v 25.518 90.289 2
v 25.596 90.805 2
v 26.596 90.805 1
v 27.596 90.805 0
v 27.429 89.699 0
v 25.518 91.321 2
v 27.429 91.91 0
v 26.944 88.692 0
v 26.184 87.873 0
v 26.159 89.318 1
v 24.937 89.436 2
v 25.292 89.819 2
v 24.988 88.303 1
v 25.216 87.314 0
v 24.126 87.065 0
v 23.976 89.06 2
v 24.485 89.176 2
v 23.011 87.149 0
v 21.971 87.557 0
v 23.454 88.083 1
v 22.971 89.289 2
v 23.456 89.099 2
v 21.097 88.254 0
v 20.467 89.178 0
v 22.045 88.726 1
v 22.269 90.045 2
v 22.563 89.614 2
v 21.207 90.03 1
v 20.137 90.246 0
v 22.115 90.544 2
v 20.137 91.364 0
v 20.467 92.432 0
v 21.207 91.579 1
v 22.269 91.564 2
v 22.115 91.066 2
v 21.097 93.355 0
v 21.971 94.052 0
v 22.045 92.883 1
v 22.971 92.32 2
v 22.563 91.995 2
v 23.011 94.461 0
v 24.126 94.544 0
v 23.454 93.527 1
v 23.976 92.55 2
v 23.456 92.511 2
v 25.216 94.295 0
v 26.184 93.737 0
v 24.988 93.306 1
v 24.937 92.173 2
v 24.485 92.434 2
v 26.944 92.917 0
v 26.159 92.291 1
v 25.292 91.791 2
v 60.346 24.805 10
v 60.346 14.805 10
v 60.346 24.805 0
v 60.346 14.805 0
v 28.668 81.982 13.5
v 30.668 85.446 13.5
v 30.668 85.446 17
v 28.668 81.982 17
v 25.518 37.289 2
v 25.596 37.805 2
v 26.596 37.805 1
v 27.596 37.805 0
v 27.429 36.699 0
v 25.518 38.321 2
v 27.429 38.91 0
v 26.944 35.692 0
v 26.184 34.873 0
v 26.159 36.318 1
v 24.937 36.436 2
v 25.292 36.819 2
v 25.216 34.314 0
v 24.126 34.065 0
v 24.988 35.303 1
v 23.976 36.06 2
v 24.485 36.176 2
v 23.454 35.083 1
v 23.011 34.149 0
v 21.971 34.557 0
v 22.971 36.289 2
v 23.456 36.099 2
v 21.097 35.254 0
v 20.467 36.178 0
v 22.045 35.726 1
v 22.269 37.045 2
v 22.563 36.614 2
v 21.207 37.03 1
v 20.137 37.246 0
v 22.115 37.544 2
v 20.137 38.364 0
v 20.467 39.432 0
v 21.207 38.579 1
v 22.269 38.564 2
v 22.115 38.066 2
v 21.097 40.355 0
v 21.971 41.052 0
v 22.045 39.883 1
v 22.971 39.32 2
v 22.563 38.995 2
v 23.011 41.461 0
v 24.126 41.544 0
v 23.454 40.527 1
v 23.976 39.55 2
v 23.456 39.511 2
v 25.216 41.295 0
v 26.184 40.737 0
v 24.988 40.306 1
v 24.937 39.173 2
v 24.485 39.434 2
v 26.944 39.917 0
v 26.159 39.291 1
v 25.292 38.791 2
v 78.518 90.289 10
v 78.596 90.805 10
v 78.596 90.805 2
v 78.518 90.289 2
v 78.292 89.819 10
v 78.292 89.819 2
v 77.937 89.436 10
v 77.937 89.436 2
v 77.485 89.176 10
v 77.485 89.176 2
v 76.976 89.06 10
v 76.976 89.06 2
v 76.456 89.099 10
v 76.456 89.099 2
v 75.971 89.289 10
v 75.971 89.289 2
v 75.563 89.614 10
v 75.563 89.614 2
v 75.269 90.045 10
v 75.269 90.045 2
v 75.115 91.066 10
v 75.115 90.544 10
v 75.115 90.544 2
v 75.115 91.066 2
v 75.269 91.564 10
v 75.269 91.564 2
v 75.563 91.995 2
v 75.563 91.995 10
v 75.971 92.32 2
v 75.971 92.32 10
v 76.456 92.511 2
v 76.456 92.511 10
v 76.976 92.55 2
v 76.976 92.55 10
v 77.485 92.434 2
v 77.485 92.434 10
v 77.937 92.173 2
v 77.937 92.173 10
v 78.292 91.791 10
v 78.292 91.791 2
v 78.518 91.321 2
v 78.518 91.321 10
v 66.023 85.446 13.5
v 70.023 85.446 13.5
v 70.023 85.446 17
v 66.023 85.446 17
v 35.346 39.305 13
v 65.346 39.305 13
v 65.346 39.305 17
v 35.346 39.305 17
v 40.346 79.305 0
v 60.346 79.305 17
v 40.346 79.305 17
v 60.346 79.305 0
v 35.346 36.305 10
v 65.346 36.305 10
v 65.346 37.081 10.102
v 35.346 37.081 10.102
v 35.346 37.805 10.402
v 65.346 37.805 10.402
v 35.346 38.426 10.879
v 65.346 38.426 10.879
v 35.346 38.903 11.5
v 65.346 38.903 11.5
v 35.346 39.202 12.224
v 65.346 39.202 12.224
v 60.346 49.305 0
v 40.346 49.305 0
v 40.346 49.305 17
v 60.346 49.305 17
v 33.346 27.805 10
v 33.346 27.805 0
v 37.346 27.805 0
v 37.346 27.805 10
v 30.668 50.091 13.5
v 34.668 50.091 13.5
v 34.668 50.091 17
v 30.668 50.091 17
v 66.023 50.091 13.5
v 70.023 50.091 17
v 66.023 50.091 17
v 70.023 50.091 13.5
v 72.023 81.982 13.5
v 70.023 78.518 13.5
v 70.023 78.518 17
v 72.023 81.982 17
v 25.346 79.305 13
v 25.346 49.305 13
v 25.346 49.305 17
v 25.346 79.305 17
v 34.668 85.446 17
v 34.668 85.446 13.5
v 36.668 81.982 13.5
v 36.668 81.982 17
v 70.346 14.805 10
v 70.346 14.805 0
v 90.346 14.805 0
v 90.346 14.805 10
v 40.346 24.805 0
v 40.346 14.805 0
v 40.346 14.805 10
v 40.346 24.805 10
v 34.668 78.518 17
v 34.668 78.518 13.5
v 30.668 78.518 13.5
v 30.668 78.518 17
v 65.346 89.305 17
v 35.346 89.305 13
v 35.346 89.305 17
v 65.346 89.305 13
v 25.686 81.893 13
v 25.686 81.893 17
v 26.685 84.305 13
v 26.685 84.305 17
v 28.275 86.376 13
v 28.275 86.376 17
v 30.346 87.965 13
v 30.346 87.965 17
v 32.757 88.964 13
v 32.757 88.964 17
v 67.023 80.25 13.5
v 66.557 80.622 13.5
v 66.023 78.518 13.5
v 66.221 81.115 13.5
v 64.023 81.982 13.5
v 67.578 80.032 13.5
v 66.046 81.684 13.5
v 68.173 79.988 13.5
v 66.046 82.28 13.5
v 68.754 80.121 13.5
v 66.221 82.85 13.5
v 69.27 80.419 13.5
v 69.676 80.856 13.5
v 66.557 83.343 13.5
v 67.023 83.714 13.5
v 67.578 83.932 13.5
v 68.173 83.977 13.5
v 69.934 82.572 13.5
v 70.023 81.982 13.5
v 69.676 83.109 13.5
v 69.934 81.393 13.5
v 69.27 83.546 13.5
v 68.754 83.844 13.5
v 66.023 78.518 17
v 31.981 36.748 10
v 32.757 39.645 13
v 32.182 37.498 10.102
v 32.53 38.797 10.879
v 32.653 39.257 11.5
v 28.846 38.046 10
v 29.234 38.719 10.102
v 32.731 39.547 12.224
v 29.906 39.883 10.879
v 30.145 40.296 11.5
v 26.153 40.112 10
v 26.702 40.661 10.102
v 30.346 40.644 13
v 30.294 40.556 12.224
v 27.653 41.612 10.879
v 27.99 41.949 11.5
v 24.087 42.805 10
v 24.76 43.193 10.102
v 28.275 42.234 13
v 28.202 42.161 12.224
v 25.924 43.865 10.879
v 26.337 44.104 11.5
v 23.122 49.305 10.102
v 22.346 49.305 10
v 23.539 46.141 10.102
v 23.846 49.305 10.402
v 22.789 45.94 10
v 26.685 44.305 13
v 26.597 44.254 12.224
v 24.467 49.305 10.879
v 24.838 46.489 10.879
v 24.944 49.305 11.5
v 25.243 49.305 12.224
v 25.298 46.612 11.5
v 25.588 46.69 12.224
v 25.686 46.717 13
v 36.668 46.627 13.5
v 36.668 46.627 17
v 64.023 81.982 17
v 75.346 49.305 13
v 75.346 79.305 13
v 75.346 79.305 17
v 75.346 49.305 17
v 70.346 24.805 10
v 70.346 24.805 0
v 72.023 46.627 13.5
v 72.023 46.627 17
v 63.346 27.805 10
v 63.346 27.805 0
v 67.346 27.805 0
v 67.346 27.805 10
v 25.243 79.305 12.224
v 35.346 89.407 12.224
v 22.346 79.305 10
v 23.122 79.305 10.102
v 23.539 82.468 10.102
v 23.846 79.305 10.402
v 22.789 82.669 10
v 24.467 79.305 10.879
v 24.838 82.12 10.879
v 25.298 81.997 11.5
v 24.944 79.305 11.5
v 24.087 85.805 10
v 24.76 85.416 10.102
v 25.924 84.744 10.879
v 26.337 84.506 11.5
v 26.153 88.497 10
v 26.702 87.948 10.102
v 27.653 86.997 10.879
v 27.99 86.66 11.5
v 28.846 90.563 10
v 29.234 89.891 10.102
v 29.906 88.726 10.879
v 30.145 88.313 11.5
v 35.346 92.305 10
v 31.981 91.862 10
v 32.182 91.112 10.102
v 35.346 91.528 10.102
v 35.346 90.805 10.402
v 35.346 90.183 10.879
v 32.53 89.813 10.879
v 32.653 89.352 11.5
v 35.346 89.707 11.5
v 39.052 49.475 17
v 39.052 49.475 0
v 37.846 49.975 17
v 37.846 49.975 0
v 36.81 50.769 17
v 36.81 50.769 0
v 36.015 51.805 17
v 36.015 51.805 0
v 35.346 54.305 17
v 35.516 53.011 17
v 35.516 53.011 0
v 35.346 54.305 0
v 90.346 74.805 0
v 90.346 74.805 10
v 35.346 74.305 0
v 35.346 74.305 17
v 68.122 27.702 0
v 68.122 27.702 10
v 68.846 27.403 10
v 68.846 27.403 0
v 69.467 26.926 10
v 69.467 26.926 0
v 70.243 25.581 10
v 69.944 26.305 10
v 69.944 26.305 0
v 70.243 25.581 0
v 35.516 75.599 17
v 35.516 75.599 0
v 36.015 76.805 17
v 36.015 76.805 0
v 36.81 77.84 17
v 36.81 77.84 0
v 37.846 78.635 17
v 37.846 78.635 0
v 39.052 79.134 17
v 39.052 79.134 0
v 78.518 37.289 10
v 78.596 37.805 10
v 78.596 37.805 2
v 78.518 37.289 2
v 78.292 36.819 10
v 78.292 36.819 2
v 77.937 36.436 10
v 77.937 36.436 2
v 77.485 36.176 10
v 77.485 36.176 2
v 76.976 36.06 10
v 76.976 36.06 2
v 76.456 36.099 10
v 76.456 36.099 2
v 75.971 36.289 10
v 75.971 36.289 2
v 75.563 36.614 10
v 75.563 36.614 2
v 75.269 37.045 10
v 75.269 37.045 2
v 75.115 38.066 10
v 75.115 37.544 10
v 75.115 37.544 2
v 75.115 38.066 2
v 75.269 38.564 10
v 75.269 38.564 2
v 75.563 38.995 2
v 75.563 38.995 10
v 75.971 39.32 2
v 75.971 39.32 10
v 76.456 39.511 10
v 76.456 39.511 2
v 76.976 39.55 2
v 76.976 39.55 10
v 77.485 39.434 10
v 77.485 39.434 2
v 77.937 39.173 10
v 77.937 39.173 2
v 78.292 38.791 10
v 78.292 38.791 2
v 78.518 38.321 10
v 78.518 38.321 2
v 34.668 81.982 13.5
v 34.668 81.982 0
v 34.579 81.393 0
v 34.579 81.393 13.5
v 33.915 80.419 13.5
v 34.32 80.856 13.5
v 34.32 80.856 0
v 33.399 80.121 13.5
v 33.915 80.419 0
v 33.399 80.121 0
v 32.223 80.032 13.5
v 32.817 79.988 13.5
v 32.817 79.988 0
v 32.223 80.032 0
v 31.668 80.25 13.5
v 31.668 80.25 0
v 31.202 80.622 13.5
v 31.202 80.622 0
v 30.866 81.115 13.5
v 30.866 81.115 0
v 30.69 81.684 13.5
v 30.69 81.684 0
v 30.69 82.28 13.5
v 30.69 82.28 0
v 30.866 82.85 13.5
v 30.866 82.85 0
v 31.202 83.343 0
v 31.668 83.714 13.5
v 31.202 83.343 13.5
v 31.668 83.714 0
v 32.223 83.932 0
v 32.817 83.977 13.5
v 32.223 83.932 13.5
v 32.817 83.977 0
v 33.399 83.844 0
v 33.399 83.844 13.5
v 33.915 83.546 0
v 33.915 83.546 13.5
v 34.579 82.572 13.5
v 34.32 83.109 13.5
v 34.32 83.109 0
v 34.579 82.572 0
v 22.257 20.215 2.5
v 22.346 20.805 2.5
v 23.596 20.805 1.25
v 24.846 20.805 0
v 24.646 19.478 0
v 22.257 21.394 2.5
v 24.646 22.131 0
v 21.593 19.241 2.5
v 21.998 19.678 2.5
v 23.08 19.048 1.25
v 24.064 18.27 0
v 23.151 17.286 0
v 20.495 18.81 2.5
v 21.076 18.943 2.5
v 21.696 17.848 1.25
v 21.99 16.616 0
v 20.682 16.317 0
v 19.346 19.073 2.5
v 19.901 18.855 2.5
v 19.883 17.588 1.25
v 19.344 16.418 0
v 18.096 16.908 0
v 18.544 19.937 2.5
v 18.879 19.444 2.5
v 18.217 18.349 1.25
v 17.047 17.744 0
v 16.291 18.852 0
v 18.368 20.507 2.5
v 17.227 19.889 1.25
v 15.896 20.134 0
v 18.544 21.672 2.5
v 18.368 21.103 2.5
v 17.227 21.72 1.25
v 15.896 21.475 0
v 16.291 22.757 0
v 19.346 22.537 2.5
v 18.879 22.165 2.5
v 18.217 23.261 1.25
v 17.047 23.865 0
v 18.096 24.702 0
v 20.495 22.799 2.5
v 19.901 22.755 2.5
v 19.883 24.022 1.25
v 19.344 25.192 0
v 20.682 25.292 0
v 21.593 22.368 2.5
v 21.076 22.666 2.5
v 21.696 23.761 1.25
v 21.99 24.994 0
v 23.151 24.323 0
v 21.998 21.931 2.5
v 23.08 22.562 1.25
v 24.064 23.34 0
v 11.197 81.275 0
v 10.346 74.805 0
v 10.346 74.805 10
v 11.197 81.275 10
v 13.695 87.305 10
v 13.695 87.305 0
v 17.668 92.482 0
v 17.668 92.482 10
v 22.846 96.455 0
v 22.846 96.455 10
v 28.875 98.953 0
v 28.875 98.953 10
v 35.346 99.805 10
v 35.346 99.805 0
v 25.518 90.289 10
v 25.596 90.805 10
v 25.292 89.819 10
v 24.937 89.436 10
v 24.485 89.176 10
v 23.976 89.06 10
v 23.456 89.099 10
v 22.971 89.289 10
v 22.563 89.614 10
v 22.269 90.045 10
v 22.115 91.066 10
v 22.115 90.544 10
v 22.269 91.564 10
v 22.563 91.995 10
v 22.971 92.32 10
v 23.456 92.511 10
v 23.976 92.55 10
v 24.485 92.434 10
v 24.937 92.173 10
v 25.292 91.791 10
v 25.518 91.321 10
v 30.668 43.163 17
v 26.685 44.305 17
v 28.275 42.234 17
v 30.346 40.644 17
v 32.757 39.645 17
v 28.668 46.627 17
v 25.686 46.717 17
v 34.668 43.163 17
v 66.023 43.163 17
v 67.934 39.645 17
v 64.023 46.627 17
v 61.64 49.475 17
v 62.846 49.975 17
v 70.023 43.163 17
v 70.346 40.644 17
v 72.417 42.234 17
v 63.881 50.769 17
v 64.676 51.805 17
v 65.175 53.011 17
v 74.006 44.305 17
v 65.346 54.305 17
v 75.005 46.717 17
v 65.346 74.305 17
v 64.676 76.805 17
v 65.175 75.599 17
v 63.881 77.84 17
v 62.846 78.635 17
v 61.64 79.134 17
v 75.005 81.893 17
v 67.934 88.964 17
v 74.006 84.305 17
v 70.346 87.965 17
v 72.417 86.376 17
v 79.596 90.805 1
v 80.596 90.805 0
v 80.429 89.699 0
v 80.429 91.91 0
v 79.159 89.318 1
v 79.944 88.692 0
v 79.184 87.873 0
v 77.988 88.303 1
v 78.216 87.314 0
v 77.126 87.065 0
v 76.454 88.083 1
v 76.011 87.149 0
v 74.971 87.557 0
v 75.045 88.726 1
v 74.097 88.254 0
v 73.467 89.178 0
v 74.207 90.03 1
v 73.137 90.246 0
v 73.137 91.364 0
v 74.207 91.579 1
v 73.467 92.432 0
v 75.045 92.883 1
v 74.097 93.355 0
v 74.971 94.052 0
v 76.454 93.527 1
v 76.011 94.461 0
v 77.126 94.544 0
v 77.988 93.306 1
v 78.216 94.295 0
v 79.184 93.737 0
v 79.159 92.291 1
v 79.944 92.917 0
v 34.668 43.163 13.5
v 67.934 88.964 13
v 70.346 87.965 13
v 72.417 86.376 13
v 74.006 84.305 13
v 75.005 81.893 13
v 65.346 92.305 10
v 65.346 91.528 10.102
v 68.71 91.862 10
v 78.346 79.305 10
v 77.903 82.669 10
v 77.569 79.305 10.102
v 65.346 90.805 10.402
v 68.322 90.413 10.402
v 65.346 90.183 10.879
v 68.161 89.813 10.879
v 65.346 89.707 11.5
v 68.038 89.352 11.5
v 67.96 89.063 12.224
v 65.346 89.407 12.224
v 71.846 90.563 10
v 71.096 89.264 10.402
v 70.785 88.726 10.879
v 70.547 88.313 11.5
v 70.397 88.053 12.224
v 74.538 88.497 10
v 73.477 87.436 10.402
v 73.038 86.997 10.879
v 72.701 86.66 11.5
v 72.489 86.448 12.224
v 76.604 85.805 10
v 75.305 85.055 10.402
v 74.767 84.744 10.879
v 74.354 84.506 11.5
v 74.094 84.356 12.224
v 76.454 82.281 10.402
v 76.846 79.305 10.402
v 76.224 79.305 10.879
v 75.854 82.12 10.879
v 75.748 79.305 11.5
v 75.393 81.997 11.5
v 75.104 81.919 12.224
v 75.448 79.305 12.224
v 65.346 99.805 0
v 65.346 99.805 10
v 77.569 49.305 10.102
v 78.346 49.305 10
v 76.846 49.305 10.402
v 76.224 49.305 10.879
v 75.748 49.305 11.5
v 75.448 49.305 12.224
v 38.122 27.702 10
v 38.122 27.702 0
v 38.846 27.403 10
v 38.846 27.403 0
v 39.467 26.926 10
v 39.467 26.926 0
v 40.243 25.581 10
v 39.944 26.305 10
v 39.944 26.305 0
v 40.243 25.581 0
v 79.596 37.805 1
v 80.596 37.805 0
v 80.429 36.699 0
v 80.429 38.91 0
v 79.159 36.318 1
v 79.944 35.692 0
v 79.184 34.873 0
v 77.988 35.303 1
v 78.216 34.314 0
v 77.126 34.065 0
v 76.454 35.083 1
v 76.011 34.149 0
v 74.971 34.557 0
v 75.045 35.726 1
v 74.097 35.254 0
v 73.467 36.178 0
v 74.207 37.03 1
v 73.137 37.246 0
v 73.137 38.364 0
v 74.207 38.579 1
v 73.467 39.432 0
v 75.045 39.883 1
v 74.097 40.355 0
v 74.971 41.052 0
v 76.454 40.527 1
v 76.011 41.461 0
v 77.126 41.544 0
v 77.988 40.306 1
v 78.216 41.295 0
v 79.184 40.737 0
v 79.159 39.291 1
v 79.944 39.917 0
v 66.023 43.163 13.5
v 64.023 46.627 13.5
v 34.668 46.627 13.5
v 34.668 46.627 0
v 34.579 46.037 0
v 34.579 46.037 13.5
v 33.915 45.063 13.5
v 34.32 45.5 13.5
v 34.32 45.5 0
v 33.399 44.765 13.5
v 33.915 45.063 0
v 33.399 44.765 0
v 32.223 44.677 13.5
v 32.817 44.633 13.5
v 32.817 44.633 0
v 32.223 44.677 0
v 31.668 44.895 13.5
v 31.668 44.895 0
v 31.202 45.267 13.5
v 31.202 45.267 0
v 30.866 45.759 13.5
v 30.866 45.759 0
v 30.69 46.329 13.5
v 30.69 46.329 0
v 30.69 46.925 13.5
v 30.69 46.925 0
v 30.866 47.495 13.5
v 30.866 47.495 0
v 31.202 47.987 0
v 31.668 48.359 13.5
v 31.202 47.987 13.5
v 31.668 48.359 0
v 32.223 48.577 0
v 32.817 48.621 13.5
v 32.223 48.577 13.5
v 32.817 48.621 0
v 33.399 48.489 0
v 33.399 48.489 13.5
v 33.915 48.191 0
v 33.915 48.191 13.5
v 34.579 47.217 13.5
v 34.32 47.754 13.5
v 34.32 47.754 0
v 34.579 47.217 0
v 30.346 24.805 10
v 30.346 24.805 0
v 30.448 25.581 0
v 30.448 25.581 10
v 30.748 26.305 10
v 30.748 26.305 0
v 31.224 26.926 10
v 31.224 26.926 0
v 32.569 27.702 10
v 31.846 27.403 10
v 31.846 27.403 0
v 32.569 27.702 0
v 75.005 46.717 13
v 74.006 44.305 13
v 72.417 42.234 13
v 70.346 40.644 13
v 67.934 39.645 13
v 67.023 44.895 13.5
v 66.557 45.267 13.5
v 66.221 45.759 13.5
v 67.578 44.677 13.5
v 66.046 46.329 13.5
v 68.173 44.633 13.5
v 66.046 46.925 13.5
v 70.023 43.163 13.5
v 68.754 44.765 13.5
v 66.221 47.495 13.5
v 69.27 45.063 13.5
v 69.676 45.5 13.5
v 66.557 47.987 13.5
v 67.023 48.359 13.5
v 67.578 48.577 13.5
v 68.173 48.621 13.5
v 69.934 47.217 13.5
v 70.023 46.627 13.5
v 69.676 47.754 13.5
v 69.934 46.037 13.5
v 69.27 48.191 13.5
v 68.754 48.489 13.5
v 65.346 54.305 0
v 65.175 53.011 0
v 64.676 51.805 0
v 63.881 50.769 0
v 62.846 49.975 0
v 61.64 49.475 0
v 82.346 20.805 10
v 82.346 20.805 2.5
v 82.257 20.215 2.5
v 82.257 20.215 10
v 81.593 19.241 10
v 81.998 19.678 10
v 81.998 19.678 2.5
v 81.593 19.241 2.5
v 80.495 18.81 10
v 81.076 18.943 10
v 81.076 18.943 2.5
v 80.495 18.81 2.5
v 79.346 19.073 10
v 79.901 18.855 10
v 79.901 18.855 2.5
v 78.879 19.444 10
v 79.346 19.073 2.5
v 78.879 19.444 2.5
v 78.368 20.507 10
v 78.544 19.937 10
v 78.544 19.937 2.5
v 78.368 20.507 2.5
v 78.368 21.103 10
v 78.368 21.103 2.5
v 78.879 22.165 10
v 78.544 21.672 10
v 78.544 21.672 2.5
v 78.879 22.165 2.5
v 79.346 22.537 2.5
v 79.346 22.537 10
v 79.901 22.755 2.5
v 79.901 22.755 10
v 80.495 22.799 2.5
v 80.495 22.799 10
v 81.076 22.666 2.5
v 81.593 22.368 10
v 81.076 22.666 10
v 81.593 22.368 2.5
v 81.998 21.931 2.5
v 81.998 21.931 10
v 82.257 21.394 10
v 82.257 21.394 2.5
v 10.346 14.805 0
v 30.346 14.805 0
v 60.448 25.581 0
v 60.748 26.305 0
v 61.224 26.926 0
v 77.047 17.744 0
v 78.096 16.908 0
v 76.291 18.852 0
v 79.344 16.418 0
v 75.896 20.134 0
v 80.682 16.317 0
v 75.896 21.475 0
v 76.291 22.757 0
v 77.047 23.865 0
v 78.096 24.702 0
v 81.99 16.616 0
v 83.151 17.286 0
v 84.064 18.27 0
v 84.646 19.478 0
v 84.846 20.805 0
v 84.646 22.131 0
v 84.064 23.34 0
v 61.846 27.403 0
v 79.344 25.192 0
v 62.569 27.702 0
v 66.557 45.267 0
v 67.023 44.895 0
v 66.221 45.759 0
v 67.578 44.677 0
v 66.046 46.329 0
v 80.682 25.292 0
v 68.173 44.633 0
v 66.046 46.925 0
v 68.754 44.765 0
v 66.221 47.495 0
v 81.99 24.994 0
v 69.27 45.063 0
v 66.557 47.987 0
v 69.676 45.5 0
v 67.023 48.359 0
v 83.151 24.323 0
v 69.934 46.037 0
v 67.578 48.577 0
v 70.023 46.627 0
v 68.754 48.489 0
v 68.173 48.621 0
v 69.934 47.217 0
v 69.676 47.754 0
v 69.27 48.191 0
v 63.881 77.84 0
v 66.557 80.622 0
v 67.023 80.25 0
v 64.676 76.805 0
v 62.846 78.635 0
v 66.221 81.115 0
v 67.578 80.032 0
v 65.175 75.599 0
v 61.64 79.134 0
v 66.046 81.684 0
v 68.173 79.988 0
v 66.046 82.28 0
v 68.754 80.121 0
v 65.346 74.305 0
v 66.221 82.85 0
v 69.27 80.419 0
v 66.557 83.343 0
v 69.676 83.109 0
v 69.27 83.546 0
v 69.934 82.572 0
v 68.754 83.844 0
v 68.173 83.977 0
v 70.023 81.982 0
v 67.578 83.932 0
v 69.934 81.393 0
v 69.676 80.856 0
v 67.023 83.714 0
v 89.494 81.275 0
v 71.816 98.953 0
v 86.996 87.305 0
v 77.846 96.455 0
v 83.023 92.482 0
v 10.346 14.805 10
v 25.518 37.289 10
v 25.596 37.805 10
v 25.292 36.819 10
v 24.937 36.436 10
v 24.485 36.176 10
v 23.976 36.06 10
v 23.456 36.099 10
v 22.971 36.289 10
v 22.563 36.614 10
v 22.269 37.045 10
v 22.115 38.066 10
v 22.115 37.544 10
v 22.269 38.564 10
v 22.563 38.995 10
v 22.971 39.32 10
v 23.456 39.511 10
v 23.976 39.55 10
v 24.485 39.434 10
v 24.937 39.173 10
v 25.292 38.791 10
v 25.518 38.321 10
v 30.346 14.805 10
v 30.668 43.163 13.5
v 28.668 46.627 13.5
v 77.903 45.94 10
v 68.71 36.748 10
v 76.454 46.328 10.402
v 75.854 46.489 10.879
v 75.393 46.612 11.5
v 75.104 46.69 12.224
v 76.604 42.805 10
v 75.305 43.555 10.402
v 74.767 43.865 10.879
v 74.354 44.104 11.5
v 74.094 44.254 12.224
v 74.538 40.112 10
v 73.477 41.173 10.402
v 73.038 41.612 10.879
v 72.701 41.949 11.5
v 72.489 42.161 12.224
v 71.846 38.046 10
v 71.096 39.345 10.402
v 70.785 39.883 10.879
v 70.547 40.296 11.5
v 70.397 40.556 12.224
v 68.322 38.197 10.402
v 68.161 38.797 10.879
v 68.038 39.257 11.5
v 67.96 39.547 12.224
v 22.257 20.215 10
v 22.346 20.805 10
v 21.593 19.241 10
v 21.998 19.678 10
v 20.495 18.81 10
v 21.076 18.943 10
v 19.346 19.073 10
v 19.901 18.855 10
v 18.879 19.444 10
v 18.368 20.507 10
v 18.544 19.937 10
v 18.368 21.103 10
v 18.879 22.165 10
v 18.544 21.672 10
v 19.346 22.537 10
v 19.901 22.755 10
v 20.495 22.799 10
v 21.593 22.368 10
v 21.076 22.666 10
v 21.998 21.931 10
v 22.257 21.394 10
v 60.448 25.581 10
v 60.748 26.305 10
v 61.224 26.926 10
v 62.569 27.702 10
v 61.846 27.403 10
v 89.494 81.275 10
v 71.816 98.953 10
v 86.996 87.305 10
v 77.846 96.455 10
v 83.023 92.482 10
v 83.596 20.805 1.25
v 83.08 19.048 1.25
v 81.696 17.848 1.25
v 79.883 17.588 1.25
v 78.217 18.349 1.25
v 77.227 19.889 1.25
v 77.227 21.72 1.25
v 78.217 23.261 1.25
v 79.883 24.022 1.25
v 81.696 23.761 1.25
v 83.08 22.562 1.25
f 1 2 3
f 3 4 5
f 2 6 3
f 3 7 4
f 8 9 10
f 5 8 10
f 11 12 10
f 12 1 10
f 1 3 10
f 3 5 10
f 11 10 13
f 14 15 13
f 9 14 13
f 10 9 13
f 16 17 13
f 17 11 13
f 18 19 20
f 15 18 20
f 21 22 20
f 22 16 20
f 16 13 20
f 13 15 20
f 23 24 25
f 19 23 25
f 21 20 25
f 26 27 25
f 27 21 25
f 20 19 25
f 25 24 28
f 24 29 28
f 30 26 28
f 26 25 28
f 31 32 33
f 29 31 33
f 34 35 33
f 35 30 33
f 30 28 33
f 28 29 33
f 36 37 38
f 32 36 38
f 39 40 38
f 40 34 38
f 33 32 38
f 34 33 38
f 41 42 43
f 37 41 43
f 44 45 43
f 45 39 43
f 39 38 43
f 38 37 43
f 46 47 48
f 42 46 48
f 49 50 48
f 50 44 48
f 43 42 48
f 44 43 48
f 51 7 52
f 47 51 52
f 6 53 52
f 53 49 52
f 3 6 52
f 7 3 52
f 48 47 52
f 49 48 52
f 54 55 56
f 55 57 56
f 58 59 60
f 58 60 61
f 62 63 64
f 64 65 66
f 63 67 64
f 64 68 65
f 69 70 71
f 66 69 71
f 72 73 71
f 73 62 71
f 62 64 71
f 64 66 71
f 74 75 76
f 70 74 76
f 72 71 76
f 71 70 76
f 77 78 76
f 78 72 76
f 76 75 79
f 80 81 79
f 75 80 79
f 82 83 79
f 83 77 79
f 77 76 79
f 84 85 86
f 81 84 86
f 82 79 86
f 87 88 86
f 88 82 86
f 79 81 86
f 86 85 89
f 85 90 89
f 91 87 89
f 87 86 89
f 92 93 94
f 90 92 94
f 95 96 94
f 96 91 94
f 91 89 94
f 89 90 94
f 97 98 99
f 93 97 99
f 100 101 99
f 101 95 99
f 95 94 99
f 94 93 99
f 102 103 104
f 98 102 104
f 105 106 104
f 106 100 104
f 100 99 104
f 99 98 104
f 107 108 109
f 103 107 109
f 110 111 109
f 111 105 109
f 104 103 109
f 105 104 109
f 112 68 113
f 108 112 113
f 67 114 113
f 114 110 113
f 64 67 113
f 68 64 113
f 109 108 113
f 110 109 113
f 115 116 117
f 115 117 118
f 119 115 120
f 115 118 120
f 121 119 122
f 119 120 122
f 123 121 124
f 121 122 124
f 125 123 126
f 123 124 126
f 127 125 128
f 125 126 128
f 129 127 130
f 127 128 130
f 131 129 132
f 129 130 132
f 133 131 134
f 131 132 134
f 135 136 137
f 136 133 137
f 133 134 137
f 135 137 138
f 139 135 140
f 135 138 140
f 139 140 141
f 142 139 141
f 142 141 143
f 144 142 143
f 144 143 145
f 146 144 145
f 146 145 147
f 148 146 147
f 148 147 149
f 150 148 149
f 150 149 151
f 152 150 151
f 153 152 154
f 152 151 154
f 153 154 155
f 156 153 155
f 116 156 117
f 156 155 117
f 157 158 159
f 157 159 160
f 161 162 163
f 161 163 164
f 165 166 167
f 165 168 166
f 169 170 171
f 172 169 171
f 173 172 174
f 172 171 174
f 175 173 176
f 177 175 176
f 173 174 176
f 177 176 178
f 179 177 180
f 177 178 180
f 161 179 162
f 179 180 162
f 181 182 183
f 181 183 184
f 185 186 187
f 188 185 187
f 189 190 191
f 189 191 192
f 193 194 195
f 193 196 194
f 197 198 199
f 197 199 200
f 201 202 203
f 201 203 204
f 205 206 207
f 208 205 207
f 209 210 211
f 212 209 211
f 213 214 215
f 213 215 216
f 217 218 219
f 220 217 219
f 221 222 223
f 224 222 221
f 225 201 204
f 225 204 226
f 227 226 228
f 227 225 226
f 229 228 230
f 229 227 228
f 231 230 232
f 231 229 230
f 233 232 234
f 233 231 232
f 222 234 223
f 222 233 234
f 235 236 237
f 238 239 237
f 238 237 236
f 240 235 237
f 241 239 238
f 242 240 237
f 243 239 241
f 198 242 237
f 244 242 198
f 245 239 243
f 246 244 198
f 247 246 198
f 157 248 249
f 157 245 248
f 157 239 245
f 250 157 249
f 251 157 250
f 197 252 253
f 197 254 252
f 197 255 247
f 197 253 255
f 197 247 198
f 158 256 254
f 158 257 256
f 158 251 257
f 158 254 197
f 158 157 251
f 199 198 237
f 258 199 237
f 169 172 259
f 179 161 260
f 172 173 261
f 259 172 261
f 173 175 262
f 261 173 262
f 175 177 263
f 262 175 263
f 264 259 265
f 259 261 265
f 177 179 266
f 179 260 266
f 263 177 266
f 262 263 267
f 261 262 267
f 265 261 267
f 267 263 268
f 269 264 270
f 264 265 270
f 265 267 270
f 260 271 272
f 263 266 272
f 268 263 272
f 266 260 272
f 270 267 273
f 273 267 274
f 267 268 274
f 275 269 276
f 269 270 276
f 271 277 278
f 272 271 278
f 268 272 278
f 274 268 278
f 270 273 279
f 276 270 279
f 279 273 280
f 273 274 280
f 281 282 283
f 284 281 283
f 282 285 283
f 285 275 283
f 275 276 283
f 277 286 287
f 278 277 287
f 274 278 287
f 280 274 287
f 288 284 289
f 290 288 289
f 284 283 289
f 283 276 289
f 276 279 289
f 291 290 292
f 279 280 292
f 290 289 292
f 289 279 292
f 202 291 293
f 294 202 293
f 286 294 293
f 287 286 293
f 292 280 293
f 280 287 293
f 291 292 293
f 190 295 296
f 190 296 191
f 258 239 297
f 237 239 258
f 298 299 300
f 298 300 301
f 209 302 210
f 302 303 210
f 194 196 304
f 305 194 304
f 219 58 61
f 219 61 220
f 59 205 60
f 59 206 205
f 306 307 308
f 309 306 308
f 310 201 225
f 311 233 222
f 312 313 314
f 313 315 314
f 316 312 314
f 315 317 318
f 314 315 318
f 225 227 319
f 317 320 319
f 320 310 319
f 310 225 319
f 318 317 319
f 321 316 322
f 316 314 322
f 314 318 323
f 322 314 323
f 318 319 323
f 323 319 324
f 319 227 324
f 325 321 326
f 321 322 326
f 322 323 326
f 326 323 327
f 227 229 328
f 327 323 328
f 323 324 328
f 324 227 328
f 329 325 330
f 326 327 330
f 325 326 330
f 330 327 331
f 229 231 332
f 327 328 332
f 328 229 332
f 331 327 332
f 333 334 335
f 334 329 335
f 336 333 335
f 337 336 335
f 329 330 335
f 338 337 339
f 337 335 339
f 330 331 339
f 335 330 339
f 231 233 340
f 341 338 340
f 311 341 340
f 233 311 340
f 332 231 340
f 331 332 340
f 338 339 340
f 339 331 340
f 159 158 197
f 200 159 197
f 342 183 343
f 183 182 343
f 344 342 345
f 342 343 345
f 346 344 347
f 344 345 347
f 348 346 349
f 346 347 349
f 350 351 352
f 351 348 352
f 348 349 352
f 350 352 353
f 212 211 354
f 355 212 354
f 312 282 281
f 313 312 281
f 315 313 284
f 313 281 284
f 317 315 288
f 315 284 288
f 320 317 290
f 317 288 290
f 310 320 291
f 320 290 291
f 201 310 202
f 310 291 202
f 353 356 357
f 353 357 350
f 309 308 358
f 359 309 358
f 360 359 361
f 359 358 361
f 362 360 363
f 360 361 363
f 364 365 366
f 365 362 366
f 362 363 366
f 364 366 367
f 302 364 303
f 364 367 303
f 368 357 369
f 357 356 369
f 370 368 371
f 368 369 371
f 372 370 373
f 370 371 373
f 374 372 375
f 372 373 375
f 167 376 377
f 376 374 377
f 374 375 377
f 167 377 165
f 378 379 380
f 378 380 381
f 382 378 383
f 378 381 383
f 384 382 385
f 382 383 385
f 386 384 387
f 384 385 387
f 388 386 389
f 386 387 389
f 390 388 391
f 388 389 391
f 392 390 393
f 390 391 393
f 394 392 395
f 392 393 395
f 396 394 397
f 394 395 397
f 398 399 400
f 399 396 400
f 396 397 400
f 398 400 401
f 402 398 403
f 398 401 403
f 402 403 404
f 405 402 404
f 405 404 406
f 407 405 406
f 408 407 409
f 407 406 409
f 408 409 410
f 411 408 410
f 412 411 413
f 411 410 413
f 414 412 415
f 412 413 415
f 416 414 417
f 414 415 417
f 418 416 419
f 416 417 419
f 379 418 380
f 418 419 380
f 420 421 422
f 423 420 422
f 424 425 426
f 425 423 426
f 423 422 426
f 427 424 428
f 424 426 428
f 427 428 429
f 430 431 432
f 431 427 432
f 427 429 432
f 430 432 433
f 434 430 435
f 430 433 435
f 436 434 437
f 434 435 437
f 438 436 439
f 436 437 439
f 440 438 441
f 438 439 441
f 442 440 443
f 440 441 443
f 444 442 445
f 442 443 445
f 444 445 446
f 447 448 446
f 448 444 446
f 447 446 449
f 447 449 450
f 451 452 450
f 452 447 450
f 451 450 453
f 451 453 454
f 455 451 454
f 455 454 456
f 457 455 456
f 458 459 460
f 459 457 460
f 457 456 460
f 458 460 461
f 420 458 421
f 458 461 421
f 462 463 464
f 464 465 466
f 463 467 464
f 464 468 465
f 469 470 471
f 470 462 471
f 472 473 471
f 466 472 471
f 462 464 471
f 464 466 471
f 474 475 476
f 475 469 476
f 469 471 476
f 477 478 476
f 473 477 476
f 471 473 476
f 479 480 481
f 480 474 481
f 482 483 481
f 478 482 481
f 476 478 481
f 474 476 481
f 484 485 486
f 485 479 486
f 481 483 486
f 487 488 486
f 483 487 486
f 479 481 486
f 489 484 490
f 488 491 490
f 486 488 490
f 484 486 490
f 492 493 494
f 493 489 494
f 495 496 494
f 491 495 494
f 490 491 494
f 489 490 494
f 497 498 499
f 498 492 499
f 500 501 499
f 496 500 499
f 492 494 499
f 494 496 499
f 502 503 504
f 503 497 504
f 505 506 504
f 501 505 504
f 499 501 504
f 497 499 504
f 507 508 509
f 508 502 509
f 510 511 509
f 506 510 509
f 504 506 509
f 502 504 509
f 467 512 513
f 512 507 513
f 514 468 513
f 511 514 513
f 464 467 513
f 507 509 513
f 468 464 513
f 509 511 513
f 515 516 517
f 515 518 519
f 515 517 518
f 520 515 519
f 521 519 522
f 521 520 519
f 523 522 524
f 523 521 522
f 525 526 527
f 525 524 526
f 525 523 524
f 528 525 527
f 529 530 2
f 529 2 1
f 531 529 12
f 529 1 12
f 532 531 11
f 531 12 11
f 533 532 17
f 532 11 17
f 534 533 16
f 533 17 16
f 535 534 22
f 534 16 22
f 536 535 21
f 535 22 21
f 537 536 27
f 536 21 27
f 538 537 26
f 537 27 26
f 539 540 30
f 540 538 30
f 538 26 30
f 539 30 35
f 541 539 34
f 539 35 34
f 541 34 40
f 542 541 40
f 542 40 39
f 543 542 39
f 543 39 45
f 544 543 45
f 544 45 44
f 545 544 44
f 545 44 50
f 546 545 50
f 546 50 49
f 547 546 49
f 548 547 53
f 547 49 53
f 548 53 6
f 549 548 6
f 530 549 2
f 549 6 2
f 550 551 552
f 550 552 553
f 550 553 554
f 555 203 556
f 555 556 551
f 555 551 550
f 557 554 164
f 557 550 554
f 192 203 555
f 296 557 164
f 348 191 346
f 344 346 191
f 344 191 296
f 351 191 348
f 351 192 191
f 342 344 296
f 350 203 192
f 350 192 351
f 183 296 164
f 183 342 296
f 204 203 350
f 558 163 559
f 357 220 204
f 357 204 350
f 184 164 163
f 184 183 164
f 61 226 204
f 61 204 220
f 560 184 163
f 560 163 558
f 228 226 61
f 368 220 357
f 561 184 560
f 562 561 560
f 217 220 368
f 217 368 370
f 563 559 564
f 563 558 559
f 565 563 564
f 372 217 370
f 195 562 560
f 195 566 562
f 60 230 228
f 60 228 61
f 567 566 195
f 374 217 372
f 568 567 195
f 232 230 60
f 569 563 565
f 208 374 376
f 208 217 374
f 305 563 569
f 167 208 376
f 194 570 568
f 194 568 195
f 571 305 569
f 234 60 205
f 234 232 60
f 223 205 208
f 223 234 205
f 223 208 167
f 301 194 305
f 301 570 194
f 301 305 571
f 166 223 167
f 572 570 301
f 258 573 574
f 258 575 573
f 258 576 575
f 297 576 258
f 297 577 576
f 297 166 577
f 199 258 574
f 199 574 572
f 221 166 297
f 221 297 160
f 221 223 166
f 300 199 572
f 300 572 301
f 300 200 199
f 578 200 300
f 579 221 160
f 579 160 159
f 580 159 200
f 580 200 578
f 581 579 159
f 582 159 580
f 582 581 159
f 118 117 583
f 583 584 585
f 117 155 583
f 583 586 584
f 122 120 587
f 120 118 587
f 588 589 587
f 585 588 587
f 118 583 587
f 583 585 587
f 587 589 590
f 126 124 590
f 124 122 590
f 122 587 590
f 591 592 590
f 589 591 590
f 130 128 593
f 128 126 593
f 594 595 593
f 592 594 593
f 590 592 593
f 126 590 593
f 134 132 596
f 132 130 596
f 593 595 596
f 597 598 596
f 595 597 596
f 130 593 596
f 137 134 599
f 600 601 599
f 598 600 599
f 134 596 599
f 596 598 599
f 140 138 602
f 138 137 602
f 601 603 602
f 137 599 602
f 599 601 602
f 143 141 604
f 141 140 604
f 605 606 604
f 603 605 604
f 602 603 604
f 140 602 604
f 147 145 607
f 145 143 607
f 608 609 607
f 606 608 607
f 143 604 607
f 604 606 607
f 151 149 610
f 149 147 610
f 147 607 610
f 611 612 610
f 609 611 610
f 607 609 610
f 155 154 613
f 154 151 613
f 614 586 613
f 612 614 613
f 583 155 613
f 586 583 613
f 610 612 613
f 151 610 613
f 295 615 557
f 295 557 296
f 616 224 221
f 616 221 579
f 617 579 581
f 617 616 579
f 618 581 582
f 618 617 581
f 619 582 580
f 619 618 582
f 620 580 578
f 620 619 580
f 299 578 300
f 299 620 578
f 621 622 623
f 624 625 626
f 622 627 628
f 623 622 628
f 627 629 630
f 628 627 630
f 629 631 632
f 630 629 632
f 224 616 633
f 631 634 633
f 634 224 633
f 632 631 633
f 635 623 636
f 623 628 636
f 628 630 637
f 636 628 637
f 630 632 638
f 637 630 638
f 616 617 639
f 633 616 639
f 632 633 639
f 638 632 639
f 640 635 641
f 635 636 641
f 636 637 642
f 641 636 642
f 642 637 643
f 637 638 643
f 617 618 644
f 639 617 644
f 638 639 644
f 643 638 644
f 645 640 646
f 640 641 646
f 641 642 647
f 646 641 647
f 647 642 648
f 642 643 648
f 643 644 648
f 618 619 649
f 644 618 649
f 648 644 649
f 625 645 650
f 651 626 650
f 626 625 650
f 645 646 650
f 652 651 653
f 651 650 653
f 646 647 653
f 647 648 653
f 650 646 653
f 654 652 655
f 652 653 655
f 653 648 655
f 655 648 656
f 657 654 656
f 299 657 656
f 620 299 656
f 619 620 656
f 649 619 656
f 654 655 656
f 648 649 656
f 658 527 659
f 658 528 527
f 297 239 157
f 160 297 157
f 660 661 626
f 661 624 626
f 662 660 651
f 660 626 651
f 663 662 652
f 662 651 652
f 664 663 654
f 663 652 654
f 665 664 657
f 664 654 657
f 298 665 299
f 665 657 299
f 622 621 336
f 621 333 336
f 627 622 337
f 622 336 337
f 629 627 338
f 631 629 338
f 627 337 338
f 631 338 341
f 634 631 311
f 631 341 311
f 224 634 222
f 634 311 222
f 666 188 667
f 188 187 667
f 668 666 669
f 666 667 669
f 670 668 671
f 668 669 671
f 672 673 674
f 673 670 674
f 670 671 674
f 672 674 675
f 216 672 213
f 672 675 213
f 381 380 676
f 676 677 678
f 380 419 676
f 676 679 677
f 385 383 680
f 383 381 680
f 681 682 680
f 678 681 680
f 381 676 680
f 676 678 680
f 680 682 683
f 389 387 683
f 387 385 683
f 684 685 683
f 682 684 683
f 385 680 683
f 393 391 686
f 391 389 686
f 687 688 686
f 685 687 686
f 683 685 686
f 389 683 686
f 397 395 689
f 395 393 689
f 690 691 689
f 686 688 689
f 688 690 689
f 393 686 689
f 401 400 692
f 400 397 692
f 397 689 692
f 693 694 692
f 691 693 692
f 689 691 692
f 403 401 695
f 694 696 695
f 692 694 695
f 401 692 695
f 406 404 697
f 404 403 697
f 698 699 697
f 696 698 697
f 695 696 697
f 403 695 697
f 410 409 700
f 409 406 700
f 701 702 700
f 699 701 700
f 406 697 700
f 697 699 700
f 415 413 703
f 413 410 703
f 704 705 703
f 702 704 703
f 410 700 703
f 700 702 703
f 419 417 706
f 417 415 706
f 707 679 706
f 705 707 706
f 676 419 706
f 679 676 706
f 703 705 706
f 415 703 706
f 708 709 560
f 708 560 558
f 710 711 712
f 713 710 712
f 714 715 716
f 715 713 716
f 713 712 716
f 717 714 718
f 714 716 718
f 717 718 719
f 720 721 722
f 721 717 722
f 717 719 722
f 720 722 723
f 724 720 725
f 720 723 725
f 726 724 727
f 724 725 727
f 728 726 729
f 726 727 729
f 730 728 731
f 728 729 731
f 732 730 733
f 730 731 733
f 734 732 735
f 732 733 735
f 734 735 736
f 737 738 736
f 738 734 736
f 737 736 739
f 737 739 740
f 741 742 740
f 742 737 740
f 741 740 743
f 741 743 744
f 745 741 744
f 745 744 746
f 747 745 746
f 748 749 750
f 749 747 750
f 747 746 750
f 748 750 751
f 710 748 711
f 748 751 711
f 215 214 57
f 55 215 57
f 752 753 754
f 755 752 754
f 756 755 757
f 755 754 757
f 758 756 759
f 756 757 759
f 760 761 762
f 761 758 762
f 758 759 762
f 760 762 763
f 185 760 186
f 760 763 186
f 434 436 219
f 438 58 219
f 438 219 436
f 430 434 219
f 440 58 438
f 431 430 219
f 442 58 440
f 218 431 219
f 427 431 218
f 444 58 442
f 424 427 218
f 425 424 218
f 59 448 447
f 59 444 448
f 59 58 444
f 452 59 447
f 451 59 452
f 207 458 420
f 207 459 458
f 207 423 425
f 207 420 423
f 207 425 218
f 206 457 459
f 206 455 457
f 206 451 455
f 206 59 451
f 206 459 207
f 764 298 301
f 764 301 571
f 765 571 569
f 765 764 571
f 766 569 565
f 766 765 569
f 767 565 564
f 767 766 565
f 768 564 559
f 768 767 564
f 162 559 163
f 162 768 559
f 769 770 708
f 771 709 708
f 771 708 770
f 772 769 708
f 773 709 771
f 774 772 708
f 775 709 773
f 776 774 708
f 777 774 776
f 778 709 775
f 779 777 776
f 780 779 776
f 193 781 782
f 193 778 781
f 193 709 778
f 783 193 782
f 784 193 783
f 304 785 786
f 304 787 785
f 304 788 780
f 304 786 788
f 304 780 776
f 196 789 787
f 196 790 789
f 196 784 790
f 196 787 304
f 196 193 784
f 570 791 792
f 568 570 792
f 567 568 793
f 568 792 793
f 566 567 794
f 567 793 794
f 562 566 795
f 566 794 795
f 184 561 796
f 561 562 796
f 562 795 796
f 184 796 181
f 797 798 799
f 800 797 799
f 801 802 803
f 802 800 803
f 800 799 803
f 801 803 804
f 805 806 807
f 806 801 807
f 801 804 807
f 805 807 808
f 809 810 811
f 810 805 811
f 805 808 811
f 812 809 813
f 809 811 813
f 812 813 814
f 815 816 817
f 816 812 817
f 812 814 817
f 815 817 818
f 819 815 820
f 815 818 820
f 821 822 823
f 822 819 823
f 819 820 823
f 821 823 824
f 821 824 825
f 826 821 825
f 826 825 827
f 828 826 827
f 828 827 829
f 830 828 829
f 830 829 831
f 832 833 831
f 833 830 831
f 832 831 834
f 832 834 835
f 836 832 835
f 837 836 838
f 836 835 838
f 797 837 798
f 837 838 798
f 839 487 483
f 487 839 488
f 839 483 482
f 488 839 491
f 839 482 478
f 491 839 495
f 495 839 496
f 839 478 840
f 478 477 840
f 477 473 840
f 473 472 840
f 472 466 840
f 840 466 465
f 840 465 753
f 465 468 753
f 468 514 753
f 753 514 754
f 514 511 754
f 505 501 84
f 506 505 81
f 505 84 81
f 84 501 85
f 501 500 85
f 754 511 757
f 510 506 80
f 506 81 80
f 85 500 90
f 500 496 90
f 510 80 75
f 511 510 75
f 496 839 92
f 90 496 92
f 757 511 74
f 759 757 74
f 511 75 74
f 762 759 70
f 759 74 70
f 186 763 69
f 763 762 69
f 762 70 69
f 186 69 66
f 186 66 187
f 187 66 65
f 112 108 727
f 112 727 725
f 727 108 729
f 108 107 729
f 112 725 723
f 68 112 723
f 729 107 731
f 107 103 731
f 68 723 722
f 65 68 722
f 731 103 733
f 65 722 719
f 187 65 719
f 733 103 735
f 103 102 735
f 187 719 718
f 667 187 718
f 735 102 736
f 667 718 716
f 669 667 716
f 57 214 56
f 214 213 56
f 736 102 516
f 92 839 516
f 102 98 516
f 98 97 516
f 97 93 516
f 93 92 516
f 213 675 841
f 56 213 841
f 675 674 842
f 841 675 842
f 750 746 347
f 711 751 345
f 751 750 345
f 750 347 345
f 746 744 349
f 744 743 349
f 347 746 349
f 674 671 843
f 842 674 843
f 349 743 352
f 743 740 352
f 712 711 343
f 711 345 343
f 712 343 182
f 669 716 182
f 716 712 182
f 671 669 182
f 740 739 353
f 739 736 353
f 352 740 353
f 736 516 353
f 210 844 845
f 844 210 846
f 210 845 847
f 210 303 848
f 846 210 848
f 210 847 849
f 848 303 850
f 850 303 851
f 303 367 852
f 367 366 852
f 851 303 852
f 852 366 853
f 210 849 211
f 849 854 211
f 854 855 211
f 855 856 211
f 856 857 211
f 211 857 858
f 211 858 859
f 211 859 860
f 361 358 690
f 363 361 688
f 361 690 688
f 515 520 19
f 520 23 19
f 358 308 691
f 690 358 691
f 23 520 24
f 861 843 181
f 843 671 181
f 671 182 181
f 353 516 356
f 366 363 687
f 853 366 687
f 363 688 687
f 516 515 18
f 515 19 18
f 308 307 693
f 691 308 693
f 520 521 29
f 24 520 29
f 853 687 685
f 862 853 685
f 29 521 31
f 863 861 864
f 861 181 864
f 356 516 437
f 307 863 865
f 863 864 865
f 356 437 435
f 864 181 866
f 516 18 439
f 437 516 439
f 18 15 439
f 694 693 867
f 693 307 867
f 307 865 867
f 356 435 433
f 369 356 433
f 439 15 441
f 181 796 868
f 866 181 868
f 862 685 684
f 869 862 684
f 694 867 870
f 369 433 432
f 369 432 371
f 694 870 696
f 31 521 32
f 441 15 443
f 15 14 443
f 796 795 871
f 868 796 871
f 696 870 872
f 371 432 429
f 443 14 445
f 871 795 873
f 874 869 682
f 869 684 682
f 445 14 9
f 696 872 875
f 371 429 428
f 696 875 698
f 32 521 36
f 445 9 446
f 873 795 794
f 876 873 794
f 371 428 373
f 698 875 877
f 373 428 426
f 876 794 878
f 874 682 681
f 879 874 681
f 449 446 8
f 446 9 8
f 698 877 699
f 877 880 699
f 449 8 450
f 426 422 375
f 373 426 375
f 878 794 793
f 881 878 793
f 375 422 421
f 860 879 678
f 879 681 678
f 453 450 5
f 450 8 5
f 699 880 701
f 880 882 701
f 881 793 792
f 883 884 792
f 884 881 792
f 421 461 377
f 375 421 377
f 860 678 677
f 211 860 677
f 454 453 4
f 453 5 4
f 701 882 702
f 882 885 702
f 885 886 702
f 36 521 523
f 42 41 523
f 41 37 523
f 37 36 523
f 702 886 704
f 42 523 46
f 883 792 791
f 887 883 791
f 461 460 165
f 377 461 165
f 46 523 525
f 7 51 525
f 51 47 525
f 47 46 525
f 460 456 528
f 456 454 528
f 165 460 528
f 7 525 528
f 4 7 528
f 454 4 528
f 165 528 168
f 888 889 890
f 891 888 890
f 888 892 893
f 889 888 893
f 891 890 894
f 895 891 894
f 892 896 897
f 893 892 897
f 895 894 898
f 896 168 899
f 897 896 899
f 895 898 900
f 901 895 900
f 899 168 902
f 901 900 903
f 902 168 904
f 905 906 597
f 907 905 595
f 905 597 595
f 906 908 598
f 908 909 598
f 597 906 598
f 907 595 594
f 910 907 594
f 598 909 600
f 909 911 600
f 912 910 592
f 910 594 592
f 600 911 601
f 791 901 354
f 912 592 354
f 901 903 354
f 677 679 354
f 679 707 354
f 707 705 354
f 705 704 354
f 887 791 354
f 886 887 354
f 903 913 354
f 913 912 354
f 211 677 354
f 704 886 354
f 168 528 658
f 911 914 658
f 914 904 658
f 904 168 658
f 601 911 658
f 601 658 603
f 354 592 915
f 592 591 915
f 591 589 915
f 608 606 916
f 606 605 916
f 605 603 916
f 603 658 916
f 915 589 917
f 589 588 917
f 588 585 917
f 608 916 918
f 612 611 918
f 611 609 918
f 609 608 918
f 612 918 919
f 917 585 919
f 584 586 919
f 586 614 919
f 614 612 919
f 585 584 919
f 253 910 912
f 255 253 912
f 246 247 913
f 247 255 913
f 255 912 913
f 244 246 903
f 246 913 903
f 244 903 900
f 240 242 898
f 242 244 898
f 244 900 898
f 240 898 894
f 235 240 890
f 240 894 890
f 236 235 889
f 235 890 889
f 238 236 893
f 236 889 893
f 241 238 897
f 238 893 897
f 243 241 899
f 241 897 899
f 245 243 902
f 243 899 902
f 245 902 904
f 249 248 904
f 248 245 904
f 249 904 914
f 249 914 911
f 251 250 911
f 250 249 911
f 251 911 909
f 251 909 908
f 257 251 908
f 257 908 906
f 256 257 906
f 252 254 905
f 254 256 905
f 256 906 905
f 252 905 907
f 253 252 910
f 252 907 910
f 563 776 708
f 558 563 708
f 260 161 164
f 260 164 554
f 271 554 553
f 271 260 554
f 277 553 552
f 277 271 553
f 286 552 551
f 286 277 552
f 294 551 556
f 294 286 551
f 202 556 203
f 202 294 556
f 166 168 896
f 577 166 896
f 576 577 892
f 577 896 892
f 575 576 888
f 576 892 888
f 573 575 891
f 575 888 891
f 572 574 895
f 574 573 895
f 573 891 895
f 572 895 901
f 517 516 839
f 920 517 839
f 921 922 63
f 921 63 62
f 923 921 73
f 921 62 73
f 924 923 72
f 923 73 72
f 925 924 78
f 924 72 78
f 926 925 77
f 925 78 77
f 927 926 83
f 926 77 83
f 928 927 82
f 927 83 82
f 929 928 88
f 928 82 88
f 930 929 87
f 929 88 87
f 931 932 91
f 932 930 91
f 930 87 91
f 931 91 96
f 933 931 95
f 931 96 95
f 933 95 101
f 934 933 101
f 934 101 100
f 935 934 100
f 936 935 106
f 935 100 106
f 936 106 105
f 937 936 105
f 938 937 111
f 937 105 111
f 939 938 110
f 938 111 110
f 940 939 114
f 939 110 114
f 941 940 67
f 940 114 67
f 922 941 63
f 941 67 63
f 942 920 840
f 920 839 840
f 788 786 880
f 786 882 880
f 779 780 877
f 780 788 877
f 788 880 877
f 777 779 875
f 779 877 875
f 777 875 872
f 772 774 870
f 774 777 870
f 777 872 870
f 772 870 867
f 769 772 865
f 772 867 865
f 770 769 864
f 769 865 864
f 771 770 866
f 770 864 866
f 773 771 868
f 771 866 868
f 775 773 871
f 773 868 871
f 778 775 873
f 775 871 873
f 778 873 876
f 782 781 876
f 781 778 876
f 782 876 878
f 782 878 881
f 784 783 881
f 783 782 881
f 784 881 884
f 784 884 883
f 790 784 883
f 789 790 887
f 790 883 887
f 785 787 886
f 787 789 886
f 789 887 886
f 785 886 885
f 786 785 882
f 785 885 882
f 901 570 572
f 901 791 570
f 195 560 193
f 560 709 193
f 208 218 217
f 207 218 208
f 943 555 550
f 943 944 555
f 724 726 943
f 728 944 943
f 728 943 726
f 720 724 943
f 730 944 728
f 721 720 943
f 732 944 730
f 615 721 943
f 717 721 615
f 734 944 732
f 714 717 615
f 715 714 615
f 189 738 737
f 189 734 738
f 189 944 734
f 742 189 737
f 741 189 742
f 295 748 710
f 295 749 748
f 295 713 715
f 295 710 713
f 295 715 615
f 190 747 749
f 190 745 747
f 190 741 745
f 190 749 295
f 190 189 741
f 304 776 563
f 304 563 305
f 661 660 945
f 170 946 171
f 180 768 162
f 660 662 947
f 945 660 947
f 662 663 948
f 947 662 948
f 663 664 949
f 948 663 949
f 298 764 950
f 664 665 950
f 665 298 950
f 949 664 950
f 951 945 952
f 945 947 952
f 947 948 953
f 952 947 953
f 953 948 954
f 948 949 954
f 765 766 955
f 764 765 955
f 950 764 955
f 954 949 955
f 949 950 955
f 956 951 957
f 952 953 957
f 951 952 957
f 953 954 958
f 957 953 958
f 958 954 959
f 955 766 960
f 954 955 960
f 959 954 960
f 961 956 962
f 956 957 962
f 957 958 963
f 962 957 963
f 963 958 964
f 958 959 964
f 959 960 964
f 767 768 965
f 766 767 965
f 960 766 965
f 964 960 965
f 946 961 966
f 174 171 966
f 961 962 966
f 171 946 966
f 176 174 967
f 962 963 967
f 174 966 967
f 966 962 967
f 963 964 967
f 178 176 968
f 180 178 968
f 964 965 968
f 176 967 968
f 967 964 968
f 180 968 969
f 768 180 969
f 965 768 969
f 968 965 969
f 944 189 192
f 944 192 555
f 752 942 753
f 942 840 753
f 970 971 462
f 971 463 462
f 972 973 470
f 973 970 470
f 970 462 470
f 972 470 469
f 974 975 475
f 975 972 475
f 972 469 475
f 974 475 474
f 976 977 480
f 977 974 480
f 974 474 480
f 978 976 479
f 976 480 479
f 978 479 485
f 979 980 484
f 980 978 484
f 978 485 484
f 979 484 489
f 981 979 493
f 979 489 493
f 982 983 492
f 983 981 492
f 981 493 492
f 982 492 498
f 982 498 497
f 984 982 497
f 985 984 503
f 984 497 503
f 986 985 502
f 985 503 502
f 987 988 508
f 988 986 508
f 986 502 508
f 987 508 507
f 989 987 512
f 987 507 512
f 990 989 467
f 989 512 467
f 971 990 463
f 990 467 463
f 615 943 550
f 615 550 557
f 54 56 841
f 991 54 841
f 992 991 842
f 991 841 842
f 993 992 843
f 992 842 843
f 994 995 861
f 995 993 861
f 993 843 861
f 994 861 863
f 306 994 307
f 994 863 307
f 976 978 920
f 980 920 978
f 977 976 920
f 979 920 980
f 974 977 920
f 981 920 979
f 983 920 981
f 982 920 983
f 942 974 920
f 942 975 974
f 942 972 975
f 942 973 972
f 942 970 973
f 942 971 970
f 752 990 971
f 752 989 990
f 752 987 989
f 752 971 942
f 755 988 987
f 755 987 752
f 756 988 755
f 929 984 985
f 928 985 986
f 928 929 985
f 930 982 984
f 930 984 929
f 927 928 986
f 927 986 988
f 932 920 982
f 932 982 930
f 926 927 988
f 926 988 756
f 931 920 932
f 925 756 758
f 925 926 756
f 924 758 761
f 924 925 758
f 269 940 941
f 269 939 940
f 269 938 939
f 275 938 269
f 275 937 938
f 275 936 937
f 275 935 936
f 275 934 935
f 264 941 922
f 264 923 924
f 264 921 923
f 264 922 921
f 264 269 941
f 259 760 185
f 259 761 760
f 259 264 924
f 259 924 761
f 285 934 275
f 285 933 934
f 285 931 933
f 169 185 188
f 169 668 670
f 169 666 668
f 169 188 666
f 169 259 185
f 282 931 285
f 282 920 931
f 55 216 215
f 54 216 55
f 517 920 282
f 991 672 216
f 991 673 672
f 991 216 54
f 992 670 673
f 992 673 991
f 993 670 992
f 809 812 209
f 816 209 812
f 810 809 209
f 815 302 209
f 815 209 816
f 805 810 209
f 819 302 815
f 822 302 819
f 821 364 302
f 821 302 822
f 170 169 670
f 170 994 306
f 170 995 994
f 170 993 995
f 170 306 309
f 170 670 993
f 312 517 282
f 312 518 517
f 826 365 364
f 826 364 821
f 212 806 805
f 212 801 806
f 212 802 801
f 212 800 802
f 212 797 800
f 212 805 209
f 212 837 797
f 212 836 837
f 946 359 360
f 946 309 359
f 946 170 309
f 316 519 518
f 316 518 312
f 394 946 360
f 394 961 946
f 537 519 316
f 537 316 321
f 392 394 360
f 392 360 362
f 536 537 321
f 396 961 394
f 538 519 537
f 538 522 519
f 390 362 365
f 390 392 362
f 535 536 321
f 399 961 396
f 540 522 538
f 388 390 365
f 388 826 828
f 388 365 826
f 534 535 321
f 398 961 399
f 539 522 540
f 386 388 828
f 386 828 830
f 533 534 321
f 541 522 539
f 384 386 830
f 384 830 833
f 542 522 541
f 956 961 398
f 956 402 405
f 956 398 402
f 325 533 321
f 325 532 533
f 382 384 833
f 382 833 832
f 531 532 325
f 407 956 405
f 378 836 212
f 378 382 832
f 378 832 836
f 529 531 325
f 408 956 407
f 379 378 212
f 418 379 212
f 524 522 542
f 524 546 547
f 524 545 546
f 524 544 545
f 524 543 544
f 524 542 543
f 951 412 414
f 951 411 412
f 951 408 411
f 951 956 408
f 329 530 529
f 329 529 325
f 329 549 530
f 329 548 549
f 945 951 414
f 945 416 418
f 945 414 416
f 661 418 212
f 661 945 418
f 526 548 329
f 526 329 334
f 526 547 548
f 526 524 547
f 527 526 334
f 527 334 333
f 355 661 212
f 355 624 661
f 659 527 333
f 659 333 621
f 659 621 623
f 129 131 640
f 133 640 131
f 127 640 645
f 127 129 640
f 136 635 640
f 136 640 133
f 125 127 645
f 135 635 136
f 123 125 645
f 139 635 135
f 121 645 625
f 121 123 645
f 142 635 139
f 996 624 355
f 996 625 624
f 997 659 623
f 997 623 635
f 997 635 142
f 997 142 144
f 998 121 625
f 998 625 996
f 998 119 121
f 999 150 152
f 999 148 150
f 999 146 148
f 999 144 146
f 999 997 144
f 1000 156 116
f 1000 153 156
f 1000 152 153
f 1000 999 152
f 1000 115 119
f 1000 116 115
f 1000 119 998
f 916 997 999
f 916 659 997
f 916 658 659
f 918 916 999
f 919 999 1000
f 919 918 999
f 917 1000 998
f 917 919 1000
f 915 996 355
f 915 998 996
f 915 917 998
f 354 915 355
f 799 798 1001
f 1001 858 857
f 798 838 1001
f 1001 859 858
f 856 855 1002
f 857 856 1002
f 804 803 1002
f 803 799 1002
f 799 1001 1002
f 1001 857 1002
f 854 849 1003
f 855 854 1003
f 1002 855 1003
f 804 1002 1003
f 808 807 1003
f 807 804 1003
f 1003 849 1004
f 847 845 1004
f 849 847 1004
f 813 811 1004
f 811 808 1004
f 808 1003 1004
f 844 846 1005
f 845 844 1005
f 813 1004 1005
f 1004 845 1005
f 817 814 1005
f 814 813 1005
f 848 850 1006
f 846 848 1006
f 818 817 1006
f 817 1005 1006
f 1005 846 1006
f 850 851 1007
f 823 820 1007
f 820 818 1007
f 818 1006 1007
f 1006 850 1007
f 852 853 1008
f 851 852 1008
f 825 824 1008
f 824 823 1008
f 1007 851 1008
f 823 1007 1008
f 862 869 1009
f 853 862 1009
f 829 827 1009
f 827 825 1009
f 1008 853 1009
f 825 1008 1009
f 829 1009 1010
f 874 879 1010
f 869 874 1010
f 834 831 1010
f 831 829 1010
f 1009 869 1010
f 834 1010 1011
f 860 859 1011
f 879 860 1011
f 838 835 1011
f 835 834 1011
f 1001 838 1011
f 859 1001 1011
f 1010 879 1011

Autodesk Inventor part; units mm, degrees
ref_plane "YZ Plane" through (0, 0, 0) normal (1, 0, 0) x (0, 1, 0)
ref_plane "XZ Plane" through (0, 0, 0) normal (0, 1, 0) x (-1, 0, 0)
ref_plane "XY Plane" through (0, 0, 0) normal (0, 0, 1) x (1, 0, 0)
sketch "Sketch1" plane through (0, 0, 0) normal (0, 0, 1) x (1, 0, 0)
  line L0 (10.3456, 14.8047) -> (30.3456, 14.8047)
  line L1 (40.3456, 14.8047) -> (60.3456, 14.8047)
  line L2 (70.3456, 14.8047) -> (90.3456, 14.8047)
  circle A0 centre (20.3456, 20.8047) radius 2
  circle A1 centre (80.3456, 20.8047) radius 2
  circle A2 centre (23.8456, 90.8047) radius 1.75
  circle A3 centre (76.8456, 90.8047) radius 1.75
  circle A4 centre (76.8456, 37.8047) radius 1.75
  circle A5 centre (23.8456, 37.8047) radius 1.75
  arc A6 (75.3456, 79.3047) -> (65.3456, 89.3047) centre (65.3456, 79.3047) ccw
  arc A7 (35.3456, 89.3047) -> (25.3456, 79.3047) centre (35.3456, 79.3047) ccw
  arc A8 (65.3456, 39.3047) -> (75.3456, 49.3047) centre (65.3456, 49.3047) ccw
  arc A9 (25.3456, 49.3047) -> (35.3456, 39.3047) centre (35.3456, 49.3047) ccw
  arc A10 (40.3456, 79.3047) -> (35.3456, 74.3047) centre (40.3456, 74.3047) ccw
  arc A11 (65.3456, 74.3047) -> (60.3456, 79.3047) centre (60.3456, 74.3047) ccw
  arc A12 (35.3456, 54.3047) -> (40.3456, 49.3047) centre (40.3456, 54.3047) ccw
  arc A13 (60.3456, 49.3047) -> (65.3456, 54.3047) centre (60.3456, 54.3047) ccw
  arc A14 (33.3456, 27.8047) -> (30.3456, 24.8047) centre (33.3456, 24.8047) ccw
  arc A15 (40.3456, 24.8047) -> (37.3456, 27.8047) centre (37.3456, 24.8047) ccw
  arc A16 (63.3456, 27.8047) -> (60.3456, 24.8047) centre (63.3456, 24.8047) ccw
  arc A17 (70.3456, 24.8047) -> (67.3456, 27.8047) centre (67.3456, 24.8047) ccw
  line L3 (34.668, 78.5182) -> (36.668, 81.9823)
  line L4 (34.668, 85.4464) -> (30.668, 85.4464)
  line L5 (28.668, 81.9823) -> (30.668, 78.5182)
  line L6 (70.0233, 78.5182) -> (72.0233, 81.9823)
  line L7 (70.0233, 85.4464) -> (66.0233, 85.4464)
  line L8 (64.0233, 81.9823) -> (66.0233, 78.5182)
  line L9 (70.0233, 43.1629) -> (72.0233, 46.627)
  line L10 (70.0233, 50.0911) -> (66.0233, 50.0911)
  line L11 (64.0233, 46.627) -> (66.0233, 43.1629)
  line L12 (34.668, 43.1629) -> (36.668, 46.627)
  line L13 (34.668, 50.0911) -> (30.668, 50.0911)
  line L14 (28.668, 46.627) -> (30.668, 43.1629)
  arc A18 (35.3456, 99.8047) -> (10.3456, 74.8047) centre (35.3456, 74.8047) ccw
  arc A19 (90.3456, 74.8047) -> (65.3456, 99.8047) centre (65.3456, 74.8047) ccw
  line L15 (10.3456, 74.8047) -> (10.3456, 14.8047)
  line L16 (30.3456, 14.8047) -> (30.3456, 24.8047)
  line L17 (33.3456, 27.8047) -> (37.3456, 27.8047)
  line L18 (40.3456, 14.8047) -> (40.3456, 24.8047)
  line L19 (60.3456, 14.8047) -> (60.3456, 24.8047)
  line L20 (63.3456, 27.8047) -> (67.3456, 27.8047)
  line L21 (70.3456, 24.8047) -> (70.3456, 14.8047)
  line L22 (90.3456, 14.8047) -> (90.3456, 74.8047)
  line L23 (35.3456, 99.8047) -> (65.3456, 99.8047)
  line L24 (35.3456, 89.3047) -> (65.3456, 89.3047)
  line L25 (75.3456, 79.3047) -> (75.3456, 49.3047)
  line L26 (65.3456, 39.3047) -> (35.3456, 39.3047)
  line L27 (25.3456, 49.3047) -> (25.3456, 79.3047)
  line L28 (30.668, 85.4464) -> (28.668, 81.9823)
  line L29 (34.668, 85.4464) -> (36.668, 81.9823)
  line L30 (34.668, 78.5182) -> (30.668, 78.5182)
  line L31 (64.0233, 81.9823) -> (66.0233, 85.4464)
  line L32 (70.0233, 85.4464) -> (72.0233, 81.9823)
  line L33 (70.0233, 78.5182) -> (66.0233, 78.5182)
  line L34 (30.668, 50.0911) -> (28.668, 46.627)
  line L35 (30.668, 43.1629) -> (34.668, 43.1629)
  line L36 (36.668, 46.627) -> (34.668, 50.0911)
  line L37 (64.0233, 46.627) -> (66.0233, 50.0911)
  line L38 (70.0233, 50.0911) -> (72.0233, 46.627)
  line L39 (70.0233, 43.1629) -> (66.0233, 43.1629)
  circle A20 centre (32.668, 81.9823) radius 2
  circle A21 centre (68.0233, 81.9823) radius 2
  circle A22 centre (68.0233, 46.627) radius 2
  circle A23 centre (32.668, 46.627) radius 2
  line L40 (35.3456, 74.3047) -> (35.3456, 54.3047)
  line L41 (40.3456, 49.3047) -> (60.3456, 49.3047)
  line L42 (65.3456, 54.3047) -> (65.3456, 74.3047)
  line L43 (60.3456, 79.3047) -> (40.3456, 79.3047)
  point P0 (0, 0)
  dimension "d0" = 4
  dimension "d1" = 4
  dimension "d2" = 4
  dimension "d3" = 4
extrude "Extrusion1" add sketch "Sketch1" along normal blind 10 contours L15 A18 L23 A19 L22 L2 L21 A17 L20 A16 L19 L1 L18 A15 L17 A14 L16 L0
extrude "Extrusion3" add sketch "Sketch1" along normal blind 17 contours L25 A8 L26 A9 L27 A7 L24 A6
extrude "Extrusion4" add sketch "Sketch1" along normal blind 13.5 contours L30 L5 L28 L4 L29 L3 | L33 L8 L31 L7 L32 L6 | L39 L11 L37 L10 L38 L9 | L35 L14 L34 L13 L36 L12
fillet "Fillet1" radius 3 8 edges at (72.4167, 42.2336, 10) (50.3456, 39.3047, 10) (28.2746, 42.2336, 10) (25.3456, 64.3047, 10) (28.2746, 86.3757, 10) (50.3456, 89.3047, 10) (72.4167, 86.3757, 10) (75.3456, 64.3047, 10)
chamfer "Chamfer1" distance 2 angle 45 4 edges at (75.0956, 90.8047, 0) (22.0956, 90.8047, 0) (75.0956, 37.8047, 0) (22.0956, 37.8047, 0)
chamfer "Chamfer2" distance 2.5 angle 45 2 edges at (78.3456, 20.8047, 0) (18.3456, 20.8047, 0)
properties part number "mbot_rear_UTM-30LX_mount"
